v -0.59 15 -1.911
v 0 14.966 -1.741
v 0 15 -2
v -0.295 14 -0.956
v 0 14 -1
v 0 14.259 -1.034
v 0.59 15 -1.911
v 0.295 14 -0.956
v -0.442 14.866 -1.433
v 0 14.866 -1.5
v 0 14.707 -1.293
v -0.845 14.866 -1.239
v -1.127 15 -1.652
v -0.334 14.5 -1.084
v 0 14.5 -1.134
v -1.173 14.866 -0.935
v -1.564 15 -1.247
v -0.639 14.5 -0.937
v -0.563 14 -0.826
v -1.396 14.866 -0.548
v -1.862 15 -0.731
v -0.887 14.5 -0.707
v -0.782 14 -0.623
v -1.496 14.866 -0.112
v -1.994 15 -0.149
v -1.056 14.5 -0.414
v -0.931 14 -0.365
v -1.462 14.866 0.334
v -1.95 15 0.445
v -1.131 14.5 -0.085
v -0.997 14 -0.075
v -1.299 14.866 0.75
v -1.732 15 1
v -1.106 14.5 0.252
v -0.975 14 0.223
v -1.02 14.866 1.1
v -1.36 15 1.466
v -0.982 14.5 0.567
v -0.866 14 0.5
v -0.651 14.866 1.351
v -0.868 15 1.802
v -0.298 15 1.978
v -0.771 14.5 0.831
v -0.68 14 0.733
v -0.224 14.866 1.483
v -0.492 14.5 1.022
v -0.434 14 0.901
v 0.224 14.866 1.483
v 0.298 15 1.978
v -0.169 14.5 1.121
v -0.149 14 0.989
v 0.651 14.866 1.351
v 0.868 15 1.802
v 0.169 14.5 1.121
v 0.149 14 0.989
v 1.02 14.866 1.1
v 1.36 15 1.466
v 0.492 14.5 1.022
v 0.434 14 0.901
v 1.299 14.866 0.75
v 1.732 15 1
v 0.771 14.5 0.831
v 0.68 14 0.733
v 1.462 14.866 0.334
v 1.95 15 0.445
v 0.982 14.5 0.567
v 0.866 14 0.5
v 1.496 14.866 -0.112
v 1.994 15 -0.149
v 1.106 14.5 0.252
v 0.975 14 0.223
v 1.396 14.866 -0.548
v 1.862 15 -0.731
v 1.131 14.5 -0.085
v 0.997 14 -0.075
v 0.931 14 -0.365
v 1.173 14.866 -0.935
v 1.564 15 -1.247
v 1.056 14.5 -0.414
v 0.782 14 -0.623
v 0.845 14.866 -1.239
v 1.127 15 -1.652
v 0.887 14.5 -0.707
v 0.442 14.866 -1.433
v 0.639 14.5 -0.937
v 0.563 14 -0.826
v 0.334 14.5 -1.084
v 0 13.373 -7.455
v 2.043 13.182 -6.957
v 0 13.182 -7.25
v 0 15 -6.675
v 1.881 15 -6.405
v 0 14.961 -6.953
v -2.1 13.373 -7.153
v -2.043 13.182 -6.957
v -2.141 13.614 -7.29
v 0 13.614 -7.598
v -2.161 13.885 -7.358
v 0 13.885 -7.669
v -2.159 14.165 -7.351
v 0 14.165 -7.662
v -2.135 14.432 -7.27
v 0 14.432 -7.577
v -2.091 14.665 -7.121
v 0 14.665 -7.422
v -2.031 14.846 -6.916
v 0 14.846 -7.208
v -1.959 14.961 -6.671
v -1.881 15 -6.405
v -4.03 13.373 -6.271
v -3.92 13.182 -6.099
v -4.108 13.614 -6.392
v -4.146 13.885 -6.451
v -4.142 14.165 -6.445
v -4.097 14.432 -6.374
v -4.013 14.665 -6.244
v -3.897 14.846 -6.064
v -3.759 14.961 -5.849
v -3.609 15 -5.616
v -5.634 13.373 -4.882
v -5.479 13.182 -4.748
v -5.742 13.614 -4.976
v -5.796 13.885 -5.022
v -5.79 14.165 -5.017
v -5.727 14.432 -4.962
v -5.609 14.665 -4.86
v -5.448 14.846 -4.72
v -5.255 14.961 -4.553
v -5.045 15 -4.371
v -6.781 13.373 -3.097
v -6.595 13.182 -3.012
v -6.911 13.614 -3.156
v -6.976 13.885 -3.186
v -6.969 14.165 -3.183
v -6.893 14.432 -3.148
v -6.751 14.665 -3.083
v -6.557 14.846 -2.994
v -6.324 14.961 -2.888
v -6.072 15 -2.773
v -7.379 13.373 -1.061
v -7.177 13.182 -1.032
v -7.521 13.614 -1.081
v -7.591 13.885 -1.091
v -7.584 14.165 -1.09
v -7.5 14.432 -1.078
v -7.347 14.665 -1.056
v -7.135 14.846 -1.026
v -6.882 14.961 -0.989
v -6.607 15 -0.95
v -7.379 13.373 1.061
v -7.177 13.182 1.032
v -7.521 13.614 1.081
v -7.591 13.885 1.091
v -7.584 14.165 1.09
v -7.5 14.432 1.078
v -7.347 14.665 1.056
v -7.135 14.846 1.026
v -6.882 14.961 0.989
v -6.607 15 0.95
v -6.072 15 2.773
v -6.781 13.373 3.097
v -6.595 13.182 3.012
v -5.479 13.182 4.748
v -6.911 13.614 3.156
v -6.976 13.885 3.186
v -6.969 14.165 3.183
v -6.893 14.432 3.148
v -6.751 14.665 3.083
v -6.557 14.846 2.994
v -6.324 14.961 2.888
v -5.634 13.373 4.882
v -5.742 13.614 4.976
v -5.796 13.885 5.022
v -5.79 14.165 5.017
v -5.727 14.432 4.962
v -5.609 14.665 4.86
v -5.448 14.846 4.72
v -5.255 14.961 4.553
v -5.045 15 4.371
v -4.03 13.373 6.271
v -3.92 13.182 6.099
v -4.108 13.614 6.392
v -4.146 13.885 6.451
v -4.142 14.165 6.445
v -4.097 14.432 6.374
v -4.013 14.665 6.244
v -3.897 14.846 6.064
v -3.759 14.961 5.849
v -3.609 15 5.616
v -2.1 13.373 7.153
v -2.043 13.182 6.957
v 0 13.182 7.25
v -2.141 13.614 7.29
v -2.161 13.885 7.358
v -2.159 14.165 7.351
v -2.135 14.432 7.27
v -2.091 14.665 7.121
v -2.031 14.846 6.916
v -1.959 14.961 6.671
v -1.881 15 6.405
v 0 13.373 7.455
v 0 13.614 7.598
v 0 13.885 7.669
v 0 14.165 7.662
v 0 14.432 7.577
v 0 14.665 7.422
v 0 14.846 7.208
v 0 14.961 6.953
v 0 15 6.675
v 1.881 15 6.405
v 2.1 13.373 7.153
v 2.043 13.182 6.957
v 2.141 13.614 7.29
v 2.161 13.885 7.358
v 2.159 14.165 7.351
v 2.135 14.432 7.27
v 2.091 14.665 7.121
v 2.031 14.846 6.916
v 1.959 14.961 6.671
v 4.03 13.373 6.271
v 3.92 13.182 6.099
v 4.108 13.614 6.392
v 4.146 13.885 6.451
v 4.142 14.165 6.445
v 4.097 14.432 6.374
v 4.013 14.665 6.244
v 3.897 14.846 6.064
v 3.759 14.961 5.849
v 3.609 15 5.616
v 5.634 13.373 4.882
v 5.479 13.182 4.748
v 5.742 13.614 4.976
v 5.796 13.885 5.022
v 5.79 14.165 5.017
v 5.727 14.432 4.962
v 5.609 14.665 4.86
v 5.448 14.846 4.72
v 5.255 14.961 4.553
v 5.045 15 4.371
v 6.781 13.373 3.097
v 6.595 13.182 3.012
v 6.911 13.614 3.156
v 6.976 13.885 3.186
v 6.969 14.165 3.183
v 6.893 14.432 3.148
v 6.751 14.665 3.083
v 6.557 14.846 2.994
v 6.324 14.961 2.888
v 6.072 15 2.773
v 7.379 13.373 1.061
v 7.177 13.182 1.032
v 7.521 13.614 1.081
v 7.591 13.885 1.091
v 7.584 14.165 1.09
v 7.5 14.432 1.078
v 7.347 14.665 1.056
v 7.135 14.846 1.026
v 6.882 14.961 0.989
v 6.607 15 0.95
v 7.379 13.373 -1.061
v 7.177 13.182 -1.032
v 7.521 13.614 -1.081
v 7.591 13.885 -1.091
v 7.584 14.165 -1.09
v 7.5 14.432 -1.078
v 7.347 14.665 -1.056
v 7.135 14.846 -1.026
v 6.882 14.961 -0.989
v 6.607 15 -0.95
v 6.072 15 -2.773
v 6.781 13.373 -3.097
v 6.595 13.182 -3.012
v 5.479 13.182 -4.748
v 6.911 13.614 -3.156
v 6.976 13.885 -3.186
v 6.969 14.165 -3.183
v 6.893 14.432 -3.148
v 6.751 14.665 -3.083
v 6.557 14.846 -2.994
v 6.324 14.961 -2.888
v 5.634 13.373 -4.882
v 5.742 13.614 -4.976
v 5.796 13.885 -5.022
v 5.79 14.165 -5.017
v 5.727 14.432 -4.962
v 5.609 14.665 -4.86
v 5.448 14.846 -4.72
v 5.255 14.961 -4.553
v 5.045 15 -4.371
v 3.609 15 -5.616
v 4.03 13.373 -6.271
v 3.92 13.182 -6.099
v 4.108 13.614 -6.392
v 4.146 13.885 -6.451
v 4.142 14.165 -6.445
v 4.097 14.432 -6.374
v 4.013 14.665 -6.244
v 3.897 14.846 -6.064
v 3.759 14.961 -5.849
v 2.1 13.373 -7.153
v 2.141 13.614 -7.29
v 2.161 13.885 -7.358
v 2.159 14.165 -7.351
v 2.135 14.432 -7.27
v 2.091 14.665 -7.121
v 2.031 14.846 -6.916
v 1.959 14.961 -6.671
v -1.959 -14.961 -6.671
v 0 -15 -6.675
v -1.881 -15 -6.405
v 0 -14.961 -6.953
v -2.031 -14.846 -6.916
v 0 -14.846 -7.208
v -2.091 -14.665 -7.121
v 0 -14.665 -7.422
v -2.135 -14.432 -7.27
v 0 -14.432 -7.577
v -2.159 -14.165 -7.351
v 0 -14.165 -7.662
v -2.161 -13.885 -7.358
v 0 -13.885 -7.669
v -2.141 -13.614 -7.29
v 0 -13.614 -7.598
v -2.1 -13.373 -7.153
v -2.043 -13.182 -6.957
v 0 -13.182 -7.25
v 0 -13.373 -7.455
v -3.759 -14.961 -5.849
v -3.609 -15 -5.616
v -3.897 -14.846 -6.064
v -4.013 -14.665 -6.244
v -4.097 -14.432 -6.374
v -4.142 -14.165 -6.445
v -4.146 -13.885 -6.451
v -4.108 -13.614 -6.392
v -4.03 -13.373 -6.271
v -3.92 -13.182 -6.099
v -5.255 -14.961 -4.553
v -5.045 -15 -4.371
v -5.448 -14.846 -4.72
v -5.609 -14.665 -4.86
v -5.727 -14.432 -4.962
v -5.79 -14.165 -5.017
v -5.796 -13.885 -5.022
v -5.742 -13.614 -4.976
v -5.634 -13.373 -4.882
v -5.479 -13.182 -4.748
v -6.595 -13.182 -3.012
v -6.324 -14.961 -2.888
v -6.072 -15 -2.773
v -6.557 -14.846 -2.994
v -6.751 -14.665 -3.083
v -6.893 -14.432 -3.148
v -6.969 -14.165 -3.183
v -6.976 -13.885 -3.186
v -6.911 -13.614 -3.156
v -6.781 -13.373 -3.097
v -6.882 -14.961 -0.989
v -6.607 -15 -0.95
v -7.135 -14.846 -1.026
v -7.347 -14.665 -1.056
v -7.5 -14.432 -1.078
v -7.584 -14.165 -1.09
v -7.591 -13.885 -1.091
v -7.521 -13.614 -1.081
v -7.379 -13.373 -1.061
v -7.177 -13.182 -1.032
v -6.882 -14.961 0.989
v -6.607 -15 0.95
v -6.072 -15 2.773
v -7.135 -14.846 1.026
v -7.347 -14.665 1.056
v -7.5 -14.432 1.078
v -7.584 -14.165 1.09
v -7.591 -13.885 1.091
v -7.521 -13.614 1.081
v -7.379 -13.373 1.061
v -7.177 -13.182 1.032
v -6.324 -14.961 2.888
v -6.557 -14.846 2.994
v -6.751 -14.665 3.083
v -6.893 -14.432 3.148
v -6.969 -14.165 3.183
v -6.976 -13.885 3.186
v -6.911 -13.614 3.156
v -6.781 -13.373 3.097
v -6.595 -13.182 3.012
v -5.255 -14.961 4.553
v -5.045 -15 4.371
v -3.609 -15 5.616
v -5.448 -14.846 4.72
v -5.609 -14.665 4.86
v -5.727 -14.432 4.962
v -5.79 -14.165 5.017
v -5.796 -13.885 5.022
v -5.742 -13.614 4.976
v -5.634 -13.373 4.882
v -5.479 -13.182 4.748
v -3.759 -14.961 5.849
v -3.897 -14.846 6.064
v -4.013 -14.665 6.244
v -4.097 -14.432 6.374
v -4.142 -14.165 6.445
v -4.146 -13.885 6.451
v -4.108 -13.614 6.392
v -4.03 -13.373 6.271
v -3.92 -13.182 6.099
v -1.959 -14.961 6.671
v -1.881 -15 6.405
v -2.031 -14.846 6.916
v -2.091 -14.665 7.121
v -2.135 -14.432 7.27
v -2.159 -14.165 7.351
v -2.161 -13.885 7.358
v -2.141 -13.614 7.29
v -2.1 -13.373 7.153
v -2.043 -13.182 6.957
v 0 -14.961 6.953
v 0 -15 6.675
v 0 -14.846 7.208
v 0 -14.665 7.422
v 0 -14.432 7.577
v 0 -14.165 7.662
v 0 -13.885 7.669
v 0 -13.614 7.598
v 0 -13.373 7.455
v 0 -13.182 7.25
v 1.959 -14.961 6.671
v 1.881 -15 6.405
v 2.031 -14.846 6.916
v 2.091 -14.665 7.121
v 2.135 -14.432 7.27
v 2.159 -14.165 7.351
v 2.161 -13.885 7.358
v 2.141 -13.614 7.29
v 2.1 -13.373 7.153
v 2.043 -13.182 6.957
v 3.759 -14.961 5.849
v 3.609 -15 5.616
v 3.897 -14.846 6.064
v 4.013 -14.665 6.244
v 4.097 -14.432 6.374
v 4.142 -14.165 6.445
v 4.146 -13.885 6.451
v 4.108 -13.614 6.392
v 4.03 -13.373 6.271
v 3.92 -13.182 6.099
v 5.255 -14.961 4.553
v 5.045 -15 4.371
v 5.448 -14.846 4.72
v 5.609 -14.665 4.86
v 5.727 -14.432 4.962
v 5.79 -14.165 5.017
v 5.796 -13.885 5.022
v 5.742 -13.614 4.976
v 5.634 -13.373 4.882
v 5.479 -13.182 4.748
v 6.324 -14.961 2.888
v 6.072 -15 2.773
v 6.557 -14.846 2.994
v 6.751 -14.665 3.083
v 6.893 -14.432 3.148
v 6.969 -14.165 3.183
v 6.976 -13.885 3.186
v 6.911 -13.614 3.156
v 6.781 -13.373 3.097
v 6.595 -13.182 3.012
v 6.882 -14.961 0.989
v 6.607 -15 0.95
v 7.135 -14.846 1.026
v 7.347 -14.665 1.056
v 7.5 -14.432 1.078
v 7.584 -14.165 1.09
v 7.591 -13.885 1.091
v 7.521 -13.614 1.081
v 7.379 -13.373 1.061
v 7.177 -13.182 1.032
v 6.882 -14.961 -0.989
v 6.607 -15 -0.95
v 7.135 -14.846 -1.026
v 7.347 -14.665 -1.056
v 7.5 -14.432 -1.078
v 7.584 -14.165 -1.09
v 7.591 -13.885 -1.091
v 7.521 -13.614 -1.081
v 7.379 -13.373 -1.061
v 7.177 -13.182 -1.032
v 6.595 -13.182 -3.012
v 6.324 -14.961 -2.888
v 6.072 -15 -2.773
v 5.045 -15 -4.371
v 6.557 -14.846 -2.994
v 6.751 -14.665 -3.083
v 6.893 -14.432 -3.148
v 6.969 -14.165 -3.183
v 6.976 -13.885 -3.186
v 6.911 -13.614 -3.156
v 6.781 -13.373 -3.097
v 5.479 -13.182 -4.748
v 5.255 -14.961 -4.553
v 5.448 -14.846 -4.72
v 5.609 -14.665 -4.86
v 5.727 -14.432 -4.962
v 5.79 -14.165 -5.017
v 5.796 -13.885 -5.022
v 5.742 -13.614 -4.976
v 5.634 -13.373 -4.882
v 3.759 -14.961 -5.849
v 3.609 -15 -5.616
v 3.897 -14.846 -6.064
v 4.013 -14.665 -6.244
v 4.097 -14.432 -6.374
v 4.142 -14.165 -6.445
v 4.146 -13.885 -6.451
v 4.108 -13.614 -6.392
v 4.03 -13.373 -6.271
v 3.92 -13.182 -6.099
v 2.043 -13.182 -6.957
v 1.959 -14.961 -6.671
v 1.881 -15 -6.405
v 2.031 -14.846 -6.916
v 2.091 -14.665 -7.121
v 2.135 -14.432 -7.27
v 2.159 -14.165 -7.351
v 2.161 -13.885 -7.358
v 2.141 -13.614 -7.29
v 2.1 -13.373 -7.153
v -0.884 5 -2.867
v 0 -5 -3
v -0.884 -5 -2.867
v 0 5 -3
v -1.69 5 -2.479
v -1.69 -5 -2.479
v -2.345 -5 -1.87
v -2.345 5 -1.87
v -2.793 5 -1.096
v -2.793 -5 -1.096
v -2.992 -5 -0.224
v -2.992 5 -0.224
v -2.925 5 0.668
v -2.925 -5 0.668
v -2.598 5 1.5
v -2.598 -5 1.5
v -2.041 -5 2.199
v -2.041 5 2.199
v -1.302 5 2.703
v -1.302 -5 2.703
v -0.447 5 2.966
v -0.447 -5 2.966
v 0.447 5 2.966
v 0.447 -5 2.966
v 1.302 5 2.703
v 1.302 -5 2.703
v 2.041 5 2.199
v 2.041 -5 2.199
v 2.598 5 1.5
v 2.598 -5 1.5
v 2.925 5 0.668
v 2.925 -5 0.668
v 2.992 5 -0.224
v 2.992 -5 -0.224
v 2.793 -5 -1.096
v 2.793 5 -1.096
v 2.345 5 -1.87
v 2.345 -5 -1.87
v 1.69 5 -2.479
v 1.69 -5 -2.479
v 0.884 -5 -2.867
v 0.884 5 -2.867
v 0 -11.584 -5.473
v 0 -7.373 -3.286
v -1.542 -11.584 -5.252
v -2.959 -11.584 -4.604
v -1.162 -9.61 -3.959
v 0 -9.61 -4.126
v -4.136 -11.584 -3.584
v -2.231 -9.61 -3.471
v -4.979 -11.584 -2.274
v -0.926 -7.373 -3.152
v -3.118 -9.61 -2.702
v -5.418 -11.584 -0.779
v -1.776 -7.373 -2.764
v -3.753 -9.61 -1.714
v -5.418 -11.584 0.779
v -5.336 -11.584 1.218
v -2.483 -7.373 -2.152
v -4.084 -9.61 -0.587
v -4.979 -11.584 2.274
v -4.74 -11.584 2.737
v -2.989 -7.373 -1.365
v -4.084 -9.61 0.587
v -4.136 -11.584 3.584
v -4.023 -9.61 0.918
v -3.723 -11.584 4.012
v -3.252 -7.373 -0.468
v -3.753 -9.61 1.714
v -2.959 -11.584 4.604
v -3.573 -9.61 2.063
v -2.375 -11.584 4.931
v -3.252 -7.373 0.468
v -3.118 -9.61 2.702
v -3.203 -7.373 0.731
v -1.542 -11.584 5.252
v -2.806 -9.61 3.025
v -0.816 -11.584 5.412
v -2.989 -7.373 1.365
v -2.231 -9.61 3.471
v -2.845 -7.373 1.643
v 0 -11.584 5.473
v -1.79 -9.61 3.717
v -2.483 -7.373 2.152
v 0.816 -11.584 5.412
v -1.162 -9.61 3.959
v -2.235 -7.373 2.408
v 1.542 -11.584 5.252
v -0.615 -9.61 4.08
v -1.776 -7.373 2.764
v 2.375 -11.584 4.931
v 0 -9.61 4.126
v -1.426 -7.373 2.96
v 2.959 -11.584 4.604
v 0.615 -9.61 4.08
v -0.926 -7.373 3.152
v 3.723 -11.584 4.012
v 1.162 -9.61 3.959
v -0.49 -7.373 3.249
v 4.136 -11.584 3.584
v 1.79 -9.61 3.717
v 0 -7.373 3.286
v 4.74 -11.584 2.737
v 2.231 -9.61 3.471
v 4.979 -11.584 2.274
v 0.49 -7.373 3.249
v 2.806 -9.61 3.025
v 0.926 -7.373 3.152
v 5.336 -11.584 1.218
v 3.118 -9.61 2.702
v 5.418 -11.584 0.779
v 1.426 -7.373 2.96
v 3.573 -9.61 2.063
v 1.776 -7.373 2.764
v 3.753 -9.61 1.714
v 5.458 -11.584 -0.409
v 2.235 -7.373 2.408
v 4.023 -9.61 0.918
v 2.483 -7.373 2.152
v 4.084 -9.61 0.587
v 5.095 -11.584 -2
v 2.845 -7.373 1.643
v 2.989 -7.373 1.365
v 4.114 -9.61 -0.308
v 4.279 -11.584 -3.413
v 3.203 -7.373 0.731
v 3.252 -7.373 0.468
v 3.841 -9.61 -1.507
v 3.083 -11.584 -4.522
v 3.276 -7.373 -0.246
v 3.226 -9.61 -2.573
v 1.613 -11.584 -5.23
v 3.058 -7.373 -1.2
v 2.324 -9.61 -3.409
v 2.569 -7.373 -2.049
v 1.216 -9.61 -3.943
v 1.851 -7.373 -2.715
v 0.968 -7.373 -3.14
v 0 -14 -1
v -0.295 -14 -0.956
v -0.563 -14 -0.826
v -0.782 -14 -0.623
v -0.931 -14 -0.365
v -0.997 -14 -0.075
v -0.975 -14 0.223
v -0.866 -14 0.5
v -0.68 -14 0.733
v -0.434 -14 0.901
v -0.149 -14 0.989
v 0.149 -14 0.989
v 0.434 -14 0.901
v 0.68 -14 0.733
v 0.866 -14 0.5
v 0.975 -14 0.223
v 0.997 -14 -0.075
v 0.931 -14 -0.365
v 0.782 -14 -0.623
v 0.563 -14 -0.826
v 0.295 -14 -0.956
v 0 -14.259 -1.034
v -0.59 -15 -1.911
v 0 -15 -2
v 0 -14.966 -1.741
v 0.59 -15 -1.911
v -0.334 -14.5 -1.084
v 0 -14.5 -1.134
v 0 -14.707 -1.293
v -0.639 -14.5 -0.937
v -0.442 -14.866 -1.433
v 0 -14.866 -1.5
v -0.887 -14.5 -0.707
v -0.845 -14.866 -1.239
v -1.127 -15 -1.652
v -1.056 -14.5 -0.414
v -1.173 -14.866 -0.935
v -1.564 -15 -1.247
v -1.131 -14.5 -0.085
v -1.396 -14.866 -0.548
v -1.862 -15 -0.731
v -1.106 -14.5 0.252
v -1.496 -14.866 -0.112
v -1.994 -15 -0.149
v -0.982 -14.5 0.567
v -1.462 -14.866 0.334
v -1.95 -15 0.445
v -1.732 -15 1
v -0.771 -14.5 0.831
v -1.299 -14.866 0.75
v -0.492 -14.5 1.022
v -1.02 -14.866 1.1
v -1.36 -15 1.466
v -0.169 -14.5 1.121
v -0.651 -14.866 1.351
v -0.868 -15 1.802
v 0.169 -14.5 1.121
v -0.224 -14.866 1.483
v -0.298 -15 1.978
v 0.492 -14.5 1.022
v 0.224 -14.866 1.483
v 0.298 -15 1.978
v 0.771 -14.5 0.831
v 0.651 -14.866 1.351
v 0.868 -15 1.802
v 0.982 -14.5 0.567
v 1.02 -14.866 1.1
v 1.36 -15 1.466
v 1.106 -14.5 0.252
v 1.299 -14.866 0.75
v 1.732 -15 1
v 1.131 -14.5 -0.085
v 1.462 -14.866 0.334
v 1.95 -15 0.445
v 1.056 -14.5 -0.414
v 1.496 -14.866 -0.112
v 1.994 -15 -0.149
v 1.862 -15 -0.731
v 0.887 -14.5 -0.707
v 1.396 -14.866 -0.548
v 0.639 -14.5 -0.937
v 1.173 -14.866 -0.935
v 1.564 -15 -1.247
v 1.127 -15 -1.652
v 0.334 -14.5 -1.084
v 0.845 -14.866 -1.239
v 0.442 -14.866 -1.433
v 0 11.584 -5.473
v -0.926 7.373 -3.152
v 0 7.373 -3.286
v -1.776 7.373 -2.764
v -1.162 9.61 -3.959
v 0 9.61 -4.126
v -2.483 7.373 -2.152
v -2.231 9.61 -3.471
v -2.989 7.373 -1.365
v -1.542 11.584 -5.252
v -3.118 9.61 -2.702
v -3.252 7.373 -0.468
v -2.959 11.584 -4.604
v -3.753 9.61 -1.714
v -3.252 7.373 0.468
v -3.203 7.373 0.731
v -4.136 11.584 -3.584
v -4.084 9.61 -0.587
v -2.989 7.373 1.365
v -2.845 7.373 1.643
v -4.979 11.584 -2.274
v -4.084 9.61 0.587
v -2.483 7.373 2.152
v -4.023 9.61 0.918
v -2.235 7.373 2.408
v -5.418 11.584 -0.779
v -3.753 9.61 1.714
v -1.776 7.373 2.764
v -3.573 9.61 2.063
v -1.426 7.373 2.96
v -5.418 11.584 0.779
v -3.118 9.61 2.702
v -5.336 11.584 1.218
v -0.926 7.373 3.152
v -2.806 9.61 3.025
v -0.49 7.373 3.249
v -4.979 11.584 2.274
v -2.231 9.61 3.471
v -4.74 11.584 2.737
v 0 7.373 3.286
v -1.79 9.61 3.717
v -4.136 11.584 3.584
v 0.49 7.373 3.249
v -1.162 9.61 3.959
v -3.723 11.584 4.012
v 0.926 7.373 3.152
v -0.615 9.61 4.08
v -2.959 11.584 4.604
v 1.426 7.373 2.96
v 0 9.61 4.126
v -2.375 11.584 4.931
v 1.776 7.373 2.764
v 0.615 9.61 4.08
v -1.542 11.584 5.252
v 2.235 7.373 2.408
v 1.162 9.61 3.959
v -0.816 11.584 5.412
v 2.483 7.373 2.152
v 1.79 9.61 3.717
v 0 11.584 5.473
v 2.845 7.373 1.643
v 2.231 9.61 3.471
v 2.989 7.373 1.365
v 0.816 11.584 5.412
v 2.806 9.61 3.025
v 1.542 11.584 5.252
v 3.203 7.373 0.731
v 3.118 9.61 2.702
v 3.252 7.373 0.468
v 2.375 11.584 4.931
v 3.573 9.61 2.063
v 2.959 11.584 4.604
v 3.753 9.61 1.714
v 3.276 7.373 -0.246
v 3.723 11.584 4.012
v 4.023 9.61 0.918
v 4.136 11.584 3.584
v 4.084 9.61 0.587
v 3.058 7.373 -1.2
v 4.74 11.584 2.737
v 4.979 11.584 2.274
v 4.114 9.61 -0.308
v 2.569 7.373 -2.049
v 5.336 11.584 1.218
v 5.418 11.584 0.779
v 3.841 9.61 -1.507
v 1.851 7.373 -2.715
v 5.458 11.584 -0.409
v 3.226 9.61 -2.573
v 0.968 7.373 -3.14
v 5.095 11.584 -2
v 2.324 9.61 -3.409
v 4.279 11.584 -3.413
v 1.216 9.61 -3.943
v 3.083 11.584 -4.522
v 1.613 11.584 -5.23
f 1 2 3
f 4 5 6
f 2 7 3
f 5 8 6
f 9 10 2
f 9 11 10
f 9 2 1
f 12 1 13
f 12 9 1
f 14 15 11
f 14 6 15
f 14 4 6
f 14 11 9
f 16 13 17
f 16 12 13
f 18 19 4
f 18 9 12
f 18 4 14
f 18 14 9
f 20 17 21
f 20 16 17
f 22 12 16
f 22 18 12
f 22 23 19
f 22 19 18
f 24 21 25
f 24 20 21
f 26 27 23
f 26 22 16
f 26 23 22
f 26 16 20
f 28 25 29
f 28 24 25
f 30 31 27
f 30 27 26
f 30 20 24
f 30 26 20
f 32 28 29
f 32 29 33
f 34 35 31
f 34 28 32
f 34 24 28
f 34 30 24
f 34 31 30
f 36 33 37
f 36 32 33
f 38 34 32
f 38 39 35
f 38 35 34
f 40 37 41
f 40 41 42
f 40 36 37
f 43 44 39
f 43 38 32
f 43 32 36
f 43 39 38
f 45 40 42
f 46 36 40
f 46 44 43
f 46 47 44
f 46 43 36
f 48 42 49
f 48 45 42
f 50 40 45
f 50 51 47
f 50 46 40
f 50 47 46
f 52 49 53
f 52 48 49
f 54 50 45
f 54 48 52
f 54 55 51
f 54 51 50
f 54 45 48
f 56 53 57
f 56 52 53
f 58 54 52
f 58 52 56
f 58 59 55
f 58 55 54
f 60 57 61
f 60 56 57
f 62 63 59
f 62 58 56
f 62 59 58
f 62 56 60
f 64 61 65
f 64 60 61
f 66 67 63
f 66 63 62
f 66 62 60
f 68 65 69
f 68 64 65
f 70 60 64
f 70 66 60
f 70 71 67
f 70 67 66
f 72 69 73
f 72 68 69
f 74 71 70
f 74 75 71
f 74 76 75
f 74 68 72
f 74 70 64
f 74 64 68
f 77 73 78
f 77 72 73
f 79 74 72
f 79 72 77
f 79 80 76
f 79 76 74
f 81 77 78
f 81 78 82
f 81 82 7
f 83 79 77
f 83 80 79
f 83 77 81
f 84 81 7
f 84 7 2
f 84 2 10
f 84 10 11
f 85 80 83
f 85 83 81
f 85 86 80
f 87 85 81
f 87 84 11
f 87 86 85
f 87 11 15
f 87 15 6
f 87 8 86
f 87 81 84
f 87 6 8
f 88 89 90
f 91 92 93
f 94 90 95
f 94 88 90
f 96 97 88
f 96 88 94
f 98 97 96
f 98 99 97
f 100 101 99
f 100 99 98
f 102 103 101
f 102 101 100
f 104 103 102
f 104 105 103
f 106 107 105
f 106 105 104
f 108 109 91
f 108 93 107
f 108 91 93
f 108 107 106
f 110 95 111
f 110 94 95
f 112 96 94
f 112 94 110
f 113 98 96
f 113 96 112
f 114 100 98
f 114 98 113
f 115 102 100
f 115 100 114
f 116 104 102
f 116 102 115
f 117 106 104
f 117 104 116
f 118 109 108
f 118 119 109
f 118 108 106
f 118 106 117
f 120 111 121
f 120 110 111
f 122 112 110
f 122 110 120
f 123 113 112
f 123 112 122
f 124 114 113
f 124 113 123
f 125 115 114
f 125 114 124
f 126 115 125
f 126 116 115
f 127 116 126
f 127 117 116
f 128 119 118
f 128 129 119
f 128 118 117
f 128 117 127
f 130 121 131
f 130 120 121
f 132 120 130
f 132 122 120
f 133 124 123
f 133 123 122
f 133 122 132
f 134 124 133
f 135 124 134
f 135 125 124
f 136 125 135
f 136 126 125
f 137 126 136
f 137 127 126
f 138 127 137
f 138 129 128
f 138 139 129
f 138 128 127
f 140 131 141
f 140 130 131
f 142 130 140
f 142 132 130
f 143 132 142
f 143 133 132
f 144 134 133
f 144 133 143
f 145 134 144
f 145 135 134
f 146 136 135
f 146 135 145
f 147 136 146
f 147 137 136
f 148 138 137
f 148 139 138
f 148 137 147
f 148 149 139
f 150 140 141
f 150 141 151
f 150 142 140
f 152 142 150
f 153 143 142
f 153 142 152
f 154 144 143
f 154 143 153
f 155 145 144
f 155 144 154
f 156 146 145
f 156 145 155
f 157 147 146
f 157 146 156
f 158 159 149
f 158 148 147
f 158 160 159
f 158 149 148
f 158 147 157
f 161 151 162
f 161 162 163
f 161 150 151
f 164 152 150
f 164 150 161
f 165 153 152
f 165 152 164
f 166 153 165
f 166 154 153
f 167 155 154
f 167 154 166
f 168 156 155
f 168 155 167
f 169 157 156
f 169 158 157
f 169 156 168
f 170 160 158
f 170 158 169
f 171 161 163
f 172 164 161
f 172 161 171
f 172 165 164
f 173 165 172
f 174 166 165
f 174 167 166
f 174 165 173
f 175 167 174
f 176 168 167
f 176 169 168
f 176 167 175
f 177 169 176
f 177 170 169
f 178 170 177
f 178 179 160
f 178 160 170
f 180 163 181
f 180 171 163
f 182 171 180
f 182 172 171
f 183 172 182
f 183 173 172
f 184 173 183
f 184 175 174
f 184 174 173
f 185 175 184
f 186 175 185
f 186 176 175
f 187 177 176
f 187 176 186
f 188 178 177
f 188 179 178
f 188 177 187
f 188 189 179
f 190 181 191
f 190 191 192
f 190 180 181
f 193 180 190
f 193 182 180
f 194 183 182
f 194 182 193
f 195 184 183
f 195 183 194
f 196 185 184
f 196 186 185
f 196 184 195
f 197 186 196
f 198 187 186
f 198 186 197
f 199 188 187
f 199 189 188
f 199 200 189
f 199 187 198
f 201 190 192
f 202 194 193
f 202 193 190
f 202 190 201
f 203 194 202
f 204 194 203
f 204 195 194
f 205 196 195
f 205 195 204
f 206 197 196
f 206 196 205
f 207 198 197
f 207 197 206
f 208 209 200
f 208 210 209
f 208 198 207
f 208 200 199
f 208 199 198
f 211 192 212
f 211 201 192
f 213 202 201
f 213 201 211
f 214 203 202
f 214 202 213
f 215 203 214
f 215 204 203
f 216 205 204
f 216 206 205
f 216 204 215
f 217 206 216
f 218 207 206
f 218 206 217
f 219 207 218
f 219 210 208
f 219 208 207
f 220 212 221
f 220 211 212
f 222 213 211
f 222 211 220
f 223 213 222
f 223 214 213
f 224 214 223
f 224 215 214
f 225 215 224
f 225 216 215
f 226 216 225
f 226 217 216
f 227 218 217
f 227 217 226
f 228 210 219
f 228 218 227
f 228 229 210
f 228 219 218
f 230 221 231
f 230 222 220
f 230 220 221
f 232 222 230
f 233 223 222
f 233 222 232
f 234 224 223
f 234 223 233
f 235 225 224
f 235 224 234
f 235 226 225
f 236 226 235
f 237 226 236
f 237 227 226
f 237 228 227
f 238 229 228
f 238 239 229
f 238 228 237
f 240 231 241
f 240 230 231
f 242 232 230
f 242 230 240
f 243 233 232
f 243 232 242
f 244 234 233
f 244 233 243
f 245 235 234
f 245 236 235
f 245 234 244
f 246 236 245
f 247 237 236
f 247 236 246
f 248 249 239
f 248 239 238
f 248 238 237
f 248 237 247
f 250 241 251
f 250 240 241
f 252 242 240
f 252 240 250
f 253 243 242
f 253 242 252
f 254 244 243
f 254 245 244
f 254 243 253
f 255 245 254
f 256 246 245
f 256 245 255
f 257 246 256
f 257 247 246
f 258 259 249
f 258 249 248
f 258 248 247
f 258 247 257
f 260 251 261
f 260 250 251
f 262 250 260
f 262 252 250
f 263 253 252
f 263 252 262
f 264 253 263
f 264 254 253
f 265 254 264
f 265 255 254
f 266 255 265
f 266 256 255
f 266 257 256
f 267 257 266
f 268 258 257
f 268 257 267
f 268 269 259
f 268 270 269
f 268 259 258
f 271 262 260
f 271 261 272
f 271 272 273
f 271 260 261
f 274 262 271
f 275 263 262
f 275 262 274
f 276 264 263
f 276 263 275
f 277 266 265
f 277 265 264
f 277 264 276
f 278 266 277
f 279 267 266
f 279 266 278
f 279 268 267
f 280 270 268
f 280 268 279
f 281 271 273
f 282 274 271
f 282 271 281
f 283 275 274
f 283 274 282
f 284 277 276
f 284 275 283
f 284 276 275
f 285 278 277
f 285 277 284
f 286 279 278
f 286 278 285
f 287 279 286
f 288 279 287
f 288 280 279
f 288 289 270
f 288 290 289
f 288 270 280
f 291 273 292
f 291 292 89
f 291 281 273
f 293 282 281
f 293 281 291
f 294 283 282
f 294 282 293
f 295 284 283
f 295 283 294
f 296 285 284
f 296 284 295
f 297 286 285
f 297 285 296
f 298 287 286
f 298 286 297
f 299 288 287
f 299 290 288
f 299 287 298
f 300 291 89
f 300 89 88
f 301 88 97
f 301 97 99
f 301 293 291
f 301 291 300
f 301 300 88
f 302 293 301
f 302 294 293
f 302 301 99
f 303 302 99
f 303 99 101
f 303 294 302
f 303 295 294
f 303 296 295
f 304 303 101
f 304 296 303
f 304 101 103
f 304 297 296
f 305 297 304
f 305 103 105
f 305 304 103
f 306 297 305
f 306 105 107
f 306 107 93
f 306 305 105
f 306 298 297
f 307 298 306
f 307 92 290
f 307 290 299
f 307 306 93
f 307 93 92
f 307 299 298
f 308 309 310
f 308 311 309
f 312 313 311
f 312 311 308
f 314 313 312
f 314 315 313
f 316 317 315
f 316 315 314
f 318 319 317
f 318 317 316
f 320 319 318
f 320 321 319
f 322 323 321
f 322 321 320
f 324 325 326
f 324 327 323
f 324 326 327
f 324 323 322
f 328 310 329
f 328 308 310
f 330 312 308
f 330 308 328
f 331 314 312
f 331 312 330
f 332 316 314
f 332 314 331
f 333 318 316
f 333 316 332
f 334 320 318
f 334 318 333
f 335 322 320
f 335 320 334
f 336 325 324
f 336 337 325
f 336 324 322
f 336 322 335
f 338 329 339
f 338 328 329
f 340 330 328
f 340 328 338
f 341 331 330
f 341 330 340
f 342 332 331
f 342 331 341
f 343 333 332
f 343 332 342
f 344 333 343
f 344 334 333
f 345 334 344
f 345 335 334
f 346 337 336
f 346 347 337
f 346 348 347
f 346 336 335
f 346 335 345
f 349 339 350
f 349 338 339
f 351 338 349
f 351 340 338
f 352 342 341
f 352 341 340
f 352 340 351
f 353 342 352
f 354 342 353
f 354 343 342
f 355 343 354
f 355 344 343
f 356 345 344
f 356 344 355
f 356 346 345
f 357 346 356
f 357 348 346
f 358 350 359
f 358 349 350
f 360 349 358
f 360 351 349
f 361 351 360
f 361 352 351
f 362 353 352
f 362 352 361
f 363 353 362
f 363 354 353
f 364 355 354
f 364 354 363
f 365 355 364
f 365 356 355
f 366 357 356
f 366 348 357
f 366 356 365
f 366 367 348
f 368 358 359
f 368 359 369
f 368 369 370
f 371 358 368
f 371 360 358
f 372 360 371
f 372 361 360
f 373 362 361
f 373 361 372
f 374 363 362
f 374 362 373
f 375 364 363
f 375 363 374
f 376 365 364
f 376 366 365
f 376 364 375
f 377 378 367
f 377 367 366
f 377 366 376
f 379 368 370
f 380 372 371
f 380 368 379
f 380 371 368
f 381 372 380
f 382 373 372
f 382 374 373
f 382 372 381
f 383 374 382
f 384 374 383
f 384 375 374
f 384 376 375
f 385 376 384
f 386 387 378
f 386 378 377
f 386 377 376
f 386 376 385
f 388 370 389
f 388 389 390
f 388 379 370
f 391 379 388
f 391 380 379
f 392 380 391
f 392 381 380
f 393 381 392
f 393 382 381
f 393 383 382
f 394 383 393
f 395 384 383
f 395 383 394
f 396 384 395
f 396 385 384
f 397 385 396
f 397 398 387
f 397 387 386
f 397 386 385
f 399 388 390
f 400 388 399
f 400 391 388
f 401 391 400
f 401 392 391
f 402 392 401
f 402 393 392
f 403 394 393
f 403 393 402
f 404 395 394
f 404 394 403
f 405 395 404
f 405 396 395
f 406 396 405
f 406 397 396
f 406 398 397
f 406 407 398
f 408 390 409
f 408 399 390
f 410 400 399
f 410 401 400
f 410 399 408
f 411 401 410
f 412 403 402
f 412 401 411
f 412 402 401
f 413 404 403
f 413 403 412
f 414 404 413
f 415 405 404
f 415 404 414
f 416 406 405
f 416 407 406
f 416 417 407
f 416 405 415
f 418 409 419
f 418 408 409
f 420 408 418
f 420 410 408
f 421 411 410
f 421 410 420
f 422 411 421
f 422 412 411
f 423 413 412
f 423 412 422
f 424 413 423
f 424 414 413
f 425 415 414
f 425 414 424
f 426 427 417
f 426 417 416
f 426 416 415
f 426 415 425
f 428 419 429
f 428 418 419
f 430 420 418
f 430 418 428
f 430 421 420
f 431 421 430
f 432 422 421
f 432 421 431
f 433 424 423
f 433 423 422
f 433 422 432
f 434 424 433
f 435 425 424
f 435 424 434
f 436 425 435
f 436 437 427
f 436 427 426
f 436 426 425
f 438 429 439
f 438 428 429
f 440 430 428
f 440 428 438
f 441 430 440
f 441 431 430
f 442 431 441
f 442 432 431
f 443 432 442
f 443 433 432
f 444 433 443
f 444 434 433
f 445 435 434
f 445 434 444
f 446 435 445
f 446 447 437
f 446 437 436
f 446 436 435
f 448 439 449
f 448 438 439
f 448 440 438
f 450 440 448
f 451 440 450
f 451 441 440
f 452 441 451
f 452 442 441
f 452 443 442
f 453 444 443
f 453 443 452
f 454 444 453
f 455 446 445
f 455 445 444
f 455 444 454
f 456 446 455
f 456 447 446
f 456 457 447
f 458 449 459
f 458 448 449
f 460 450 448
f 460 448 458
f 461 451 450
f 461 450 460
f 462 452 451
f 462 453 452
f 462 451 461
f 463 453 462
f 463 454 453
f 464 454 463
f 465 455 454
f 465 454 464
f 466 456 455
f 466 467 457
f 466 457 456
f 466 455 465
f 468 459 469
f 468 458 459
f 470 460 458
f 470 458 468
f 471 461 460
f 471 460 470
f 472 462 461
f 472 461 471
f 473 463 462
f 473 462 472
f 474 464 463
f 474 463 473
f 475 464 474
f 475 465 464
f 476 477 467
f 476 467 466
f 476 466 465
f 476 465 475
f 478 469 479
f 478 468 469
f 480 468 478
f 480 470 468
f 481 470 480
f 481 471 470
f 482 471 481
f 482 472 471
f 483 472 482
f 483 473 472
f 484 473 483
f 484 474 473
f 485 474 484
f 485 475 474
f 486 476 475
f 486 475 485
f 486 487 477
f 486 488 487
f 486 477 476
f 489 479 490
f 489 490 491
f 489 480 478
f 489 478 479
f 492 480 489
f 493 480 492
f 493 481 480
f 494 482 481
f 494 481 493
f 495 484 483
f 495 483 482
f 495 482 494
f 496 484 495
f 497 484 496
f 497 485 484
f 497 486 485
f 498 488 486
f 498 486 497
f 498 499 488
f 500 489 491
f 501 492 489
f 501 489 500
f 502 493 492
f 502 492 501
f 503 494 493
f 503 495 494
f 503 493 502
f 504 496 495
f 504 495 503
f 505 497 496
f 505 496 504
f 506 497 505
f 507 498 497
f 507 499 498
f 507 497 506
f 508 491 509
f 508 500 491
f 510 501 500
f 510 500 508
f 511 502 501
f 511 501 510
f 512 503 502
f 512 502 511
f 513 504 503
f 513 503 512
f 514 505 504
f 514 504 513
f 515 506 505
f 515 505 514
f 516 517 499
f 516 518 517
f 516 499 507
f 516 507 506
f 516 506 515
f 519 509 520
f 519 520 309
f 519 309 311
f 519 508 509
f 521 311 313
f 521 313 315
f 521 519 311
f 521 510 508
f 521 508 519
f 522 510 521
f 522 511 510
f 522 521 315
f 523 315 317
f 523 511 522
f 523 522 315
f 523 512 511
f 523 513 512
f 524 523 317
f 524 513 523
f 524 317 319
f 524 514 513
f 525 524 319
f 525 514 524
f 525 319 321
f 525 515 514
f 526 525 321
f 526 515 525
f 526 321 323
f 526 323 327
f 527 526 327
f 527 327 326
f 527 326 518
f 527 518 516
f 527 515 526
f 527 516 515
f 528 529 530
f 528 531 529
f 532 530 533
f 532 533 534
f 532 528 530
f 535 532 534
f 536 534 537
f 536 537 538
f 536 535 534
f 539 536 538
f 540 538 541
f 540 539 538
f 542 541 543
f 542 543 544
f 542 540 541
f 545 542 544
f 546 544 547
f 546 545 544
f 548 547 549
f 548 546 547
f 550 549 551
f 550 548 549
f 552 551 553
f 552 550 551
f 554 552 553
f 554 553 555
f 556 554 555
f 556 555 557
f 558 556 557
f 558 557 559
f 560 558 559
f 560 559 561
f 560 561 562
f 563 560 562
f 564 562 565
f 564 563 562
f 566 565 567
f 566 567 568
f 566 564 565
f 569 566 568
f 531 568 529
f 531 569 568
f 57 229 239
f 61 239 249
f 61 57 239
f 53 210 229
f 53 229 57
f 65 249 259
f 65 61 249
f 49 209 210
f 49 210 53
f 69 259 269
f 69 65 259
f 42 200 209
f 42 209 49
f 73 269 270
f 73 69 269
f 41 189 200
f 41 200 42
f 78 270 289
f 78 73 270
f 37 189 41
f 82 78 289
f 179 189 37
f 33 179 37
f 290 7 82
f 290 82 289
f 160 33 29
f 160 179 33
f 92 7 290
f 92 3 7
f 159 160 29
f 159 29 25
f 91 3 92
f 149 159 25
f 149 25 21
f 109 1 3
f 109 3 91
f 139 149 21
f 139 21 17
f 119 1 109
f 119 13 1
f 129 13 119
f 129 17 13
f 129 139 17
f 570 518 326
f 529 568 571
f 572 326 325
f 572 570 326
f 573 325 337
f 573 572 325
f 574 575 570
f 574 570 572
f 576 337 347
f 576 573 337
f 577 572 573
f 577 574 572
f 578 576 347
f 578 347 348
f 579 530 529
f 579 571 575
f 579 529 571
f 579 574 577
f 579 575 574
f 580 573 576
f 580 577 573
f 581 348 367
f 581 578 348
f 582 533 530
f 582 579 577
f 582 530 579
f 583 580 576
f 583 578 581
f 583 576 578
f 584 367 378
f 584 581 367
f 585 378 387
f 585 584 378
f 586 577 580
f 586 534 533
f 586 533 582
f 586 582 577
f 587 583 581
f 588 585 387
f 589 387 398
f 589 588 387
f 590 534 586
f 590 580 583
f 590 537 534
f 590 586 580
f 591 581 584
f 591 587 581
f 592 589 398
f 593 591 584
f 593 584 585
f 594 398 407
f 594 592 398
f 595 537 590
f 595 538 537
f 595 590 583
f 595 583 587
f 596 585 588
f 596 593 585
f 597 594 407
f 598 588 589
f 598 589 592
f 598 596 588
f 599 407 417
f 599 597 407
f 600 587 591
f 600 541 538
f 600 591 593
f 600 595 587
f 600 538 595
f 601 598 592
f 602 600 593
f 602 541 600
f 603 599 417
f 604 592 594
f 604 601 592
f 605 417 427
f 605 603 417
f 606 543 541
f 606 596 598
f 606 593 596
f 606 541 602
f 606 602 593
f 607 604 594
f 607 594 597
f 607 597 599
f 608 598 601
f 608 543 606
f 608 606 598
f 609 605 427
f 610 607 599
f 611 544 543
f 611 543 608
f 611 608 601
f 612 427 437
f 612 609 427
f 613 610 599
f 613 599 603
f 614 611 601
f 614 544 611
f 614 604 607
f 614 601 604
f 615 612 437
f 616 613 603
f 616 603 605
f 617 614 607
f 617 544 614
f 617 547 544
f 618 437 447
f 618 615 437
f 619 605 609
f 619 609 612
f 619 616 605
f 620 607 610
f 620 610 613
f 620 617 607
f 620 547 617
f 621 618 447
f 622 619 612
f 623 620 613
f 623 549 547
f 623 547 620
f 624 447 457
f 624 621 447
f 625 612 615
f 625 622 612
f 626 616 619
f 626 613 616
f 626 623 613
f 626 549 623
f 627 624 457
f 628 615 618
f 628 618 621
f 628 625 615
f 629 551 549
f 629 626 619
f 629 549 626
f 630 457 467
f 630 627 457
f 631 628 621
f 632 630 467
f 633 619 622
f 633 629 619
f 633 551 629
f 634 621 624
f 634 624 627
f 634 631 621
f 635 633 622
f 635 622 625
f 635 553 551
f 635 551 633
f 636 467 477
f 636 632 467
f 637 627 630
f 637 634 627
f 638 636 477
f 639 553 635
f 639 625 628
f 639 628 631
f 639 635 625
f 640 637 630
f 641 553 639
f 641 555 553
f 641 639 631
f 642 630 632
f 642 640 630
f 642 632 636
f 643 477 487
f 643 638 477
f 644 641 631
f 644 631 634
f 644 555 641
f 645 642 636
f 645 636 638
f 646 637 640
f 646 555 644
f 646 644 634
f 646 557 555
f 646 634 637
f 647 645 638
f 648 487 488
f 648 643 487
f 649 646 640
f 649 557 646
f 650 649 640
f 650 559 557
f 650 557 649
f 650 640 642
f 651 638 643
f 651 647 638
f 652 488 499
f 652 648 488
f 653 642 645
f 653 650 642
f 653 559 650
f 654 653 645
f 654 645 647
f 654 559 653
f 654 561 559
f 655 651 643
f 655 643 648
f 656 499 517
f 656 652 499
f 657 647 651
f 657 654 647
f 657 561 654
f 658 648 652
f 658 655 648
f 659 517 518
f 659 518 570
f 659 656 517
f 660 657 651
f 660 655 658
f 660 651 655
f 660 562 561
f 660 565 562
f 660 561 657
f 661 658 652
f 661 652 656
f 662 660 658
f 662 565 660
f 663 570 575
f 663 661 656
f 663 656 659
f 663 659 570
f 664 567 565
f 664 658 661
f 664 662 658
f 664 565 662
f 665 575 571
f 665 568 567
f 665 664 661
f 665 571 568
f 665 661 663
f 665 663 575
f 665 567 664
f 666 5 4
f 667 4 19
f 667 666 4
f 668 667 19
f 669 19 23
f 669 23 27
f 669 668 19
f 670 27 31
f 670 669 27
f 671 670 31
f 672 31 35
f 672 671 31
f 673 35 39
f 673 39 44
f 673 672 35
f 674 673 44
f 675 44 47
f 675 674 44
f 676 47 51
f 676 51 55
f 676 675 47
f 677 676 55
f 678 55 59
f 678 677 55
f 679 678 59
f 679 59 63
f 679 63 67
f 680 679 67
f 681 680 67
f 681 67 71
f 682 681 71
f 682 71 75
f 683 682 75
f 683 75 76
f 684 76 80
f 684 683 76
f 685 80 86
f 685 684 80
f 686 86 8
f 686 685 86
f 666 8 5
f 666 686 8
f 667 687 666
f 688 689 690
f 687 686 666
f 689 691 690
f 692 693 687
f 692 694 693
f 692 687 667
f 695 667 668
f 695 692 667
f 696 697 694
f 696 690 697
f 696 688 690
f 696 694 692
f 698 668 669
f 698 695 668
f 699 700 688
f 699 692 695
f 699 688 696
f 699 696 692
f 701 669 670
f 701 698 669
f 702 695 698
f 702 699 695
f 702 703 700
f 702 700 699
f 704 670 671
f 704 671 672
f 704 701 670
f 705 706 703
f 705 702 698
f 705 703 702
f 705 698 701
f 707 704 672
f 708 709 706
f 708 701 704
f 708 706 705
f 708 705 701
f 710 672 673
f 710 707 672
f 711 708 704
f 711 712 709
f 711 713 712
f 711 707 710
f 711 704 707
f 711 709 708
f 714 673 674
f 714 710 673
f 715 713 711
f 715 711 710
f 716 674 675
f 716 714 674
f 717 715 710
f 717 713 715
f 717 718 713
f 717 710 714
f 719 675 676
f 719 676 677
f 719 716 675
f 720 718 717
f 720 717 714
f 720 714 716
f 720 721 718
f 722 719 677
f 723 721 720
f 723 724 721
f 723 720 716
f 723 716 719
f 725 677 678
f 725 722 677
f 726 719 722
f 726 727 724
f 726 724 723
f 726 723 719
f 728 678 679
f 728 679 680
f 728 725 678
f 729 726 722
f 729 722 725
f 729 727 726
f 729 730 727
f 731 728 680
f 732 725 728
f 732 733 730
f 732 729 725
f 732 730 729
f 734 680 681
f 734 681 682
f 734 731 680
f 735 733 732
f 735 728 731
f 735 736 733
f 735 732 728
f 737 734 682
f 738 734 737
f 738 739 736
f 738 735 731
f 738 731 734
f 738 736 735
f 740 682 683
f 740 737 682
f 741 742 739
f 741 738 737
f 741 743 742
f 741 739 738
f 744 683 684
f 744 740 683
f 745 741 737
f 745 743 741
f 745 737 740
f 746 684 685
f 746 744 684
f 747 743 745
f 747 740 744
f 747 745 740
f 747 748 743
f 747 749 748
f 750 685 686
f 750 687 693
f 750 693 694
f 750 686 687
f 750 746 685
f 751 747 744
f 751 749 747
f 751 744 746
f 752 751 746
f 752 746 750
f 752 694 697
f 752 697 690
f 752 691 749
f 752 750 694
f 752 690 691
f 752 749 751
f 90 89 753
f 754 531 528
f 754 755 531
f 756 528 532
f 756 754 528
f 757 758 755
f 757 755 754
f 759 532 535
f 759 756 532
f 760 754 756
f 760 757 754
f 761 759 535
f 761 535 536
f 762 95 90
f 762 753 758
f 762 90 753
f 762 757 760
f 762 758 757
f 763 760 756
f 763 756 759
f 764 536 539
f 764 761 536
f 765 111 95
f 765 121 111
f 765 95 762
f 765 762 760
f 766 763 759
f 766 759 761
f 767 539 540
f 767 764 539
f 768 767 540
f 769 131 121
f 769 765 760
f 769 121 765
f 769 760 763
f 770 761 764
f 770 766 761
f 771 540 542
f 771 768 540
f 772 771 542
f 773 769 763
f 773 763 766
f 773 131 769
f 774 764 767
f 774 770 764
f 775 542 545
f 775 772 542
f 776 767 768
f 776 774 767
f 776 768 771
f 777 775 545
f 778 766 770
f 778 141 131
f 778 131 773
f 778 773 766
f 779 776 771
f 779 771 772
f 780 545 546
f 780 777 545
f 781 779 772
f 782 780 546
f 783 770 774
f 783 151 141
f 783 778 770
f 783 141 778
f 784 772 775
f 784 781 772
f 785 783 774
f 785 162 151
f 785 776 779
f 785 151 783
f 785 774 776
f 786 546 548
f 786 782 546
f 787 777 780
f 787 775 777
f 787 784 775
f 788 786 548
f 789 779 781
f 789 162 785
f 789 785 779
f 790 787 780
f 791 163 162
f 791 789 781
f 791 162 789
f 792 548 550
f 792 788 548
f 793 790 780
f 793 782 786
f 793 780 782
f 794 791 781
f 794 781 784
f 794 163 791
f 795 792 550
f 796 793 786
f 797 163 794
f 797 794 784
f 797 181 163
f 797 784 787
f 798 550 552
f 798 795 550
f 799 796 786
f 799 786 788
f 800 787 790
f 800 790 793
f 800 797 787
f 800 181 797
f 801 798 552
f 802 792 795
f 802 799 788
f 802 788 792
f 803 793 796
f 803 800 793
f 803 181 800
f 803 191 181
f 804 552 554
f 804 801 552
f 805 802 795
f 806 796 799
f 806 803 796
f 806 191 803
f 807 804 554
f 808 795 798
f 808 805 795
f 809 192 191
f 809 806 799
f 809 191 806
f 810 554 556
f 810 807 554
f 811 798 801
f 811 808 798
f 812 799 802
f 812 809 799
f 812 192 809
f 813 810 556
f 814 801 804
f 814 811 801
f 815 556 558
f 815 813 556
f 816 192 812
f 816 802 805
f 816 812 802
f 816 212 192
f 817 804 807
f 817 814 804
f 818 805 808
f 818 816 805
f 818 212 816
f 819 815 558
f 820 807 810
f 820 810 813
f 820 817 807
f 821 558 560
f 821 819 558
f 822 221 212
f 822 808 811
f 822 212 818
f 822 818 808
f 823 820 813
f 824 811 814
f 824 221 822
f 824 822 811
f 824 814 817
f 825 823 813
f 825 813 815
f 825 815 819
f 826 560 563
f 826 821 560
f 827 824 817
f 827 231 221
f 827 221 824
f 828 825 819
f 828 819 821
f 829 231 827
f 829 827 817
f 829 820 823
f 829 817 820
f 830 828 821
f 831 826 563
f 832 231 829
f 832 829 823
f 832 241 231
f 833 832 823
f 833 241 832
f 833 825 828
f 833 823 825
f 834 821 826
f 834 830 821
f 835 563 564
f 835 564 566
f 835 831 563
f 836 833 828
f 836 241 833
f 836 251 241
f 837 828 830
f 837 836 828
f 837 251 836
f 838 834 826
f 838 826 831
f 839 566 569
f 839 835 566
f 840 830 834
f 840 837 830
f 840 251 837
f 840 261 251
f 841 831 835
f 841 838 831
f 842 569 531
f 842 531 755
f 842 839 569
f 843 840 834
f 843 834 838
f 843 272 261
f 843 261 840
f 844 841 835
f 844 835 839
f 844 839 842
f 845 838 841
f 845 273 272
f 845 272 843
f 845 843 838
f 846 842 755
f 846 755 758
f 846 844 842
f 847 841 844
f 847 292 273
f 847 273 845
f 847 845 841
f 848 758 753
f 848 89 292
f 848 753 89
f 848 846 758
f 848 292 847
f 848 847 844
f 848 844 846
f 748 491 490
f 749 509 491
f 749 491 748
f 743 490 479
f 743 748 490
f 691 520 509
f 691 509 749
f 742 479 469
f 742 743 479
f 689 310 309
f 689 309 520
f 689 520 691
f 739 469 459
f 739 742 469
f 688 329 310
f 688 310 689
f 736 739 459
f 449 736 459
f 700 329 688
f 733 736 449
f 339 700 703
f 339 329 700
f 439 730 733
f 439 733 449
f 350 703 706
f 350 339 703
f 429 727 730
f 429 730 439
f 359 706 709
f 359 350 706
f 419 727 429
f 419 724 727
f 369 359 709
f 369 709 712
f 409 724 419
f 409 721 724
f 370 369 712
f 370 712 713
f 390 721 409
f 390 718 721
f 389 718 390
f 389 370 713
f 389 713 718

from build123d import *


with BuildPart() as part:
    # 草图4 → 旋转1 (revolve)
    with BuildSketch(Plane.XY, mode=Mode.PRIVATE) as revolve_1_sk:
        with BuildLine():
            Line((-6.67544468, 15), (-2, 15))
            ThreePointArc((-2, 15), (-1.292893219, 14.707106781), (-1, 14))
            Line((-1, 14), (-1, -14))
            ThreePointArc((-1, -14), (-1.292893219, -14.707106781), (-2, -15))
            Line((-2, -15), (-6.67544468, -15))
            ThreePointArc((-6.67544468, -15), (-7.628907269, -14.301511345), (-7.250404254, -13.181818182))
            ThreePointArc((-7.250404254, -13.181818182), (-4.125994212, -9.609991461), (-3, -5))
            Line((-3, -5), (-3, 5))
            ThreePointArc((-3, 5), (-4.125994212, 9.609991461), (-7.250404254, 13.181818182))
            ThreePointArc((-7.250404254, 13.181818182), (-7.628907269, 14.301511345), (-6.67544468, 15))
        make_face()
    revolve(revolve_1_sk.sketch.rotate(Axis((0, 0, 0), (0, 1, 0)), 270), axis=Axis((0, 0, 0), (0, 1, 0)))


solid = part.part
